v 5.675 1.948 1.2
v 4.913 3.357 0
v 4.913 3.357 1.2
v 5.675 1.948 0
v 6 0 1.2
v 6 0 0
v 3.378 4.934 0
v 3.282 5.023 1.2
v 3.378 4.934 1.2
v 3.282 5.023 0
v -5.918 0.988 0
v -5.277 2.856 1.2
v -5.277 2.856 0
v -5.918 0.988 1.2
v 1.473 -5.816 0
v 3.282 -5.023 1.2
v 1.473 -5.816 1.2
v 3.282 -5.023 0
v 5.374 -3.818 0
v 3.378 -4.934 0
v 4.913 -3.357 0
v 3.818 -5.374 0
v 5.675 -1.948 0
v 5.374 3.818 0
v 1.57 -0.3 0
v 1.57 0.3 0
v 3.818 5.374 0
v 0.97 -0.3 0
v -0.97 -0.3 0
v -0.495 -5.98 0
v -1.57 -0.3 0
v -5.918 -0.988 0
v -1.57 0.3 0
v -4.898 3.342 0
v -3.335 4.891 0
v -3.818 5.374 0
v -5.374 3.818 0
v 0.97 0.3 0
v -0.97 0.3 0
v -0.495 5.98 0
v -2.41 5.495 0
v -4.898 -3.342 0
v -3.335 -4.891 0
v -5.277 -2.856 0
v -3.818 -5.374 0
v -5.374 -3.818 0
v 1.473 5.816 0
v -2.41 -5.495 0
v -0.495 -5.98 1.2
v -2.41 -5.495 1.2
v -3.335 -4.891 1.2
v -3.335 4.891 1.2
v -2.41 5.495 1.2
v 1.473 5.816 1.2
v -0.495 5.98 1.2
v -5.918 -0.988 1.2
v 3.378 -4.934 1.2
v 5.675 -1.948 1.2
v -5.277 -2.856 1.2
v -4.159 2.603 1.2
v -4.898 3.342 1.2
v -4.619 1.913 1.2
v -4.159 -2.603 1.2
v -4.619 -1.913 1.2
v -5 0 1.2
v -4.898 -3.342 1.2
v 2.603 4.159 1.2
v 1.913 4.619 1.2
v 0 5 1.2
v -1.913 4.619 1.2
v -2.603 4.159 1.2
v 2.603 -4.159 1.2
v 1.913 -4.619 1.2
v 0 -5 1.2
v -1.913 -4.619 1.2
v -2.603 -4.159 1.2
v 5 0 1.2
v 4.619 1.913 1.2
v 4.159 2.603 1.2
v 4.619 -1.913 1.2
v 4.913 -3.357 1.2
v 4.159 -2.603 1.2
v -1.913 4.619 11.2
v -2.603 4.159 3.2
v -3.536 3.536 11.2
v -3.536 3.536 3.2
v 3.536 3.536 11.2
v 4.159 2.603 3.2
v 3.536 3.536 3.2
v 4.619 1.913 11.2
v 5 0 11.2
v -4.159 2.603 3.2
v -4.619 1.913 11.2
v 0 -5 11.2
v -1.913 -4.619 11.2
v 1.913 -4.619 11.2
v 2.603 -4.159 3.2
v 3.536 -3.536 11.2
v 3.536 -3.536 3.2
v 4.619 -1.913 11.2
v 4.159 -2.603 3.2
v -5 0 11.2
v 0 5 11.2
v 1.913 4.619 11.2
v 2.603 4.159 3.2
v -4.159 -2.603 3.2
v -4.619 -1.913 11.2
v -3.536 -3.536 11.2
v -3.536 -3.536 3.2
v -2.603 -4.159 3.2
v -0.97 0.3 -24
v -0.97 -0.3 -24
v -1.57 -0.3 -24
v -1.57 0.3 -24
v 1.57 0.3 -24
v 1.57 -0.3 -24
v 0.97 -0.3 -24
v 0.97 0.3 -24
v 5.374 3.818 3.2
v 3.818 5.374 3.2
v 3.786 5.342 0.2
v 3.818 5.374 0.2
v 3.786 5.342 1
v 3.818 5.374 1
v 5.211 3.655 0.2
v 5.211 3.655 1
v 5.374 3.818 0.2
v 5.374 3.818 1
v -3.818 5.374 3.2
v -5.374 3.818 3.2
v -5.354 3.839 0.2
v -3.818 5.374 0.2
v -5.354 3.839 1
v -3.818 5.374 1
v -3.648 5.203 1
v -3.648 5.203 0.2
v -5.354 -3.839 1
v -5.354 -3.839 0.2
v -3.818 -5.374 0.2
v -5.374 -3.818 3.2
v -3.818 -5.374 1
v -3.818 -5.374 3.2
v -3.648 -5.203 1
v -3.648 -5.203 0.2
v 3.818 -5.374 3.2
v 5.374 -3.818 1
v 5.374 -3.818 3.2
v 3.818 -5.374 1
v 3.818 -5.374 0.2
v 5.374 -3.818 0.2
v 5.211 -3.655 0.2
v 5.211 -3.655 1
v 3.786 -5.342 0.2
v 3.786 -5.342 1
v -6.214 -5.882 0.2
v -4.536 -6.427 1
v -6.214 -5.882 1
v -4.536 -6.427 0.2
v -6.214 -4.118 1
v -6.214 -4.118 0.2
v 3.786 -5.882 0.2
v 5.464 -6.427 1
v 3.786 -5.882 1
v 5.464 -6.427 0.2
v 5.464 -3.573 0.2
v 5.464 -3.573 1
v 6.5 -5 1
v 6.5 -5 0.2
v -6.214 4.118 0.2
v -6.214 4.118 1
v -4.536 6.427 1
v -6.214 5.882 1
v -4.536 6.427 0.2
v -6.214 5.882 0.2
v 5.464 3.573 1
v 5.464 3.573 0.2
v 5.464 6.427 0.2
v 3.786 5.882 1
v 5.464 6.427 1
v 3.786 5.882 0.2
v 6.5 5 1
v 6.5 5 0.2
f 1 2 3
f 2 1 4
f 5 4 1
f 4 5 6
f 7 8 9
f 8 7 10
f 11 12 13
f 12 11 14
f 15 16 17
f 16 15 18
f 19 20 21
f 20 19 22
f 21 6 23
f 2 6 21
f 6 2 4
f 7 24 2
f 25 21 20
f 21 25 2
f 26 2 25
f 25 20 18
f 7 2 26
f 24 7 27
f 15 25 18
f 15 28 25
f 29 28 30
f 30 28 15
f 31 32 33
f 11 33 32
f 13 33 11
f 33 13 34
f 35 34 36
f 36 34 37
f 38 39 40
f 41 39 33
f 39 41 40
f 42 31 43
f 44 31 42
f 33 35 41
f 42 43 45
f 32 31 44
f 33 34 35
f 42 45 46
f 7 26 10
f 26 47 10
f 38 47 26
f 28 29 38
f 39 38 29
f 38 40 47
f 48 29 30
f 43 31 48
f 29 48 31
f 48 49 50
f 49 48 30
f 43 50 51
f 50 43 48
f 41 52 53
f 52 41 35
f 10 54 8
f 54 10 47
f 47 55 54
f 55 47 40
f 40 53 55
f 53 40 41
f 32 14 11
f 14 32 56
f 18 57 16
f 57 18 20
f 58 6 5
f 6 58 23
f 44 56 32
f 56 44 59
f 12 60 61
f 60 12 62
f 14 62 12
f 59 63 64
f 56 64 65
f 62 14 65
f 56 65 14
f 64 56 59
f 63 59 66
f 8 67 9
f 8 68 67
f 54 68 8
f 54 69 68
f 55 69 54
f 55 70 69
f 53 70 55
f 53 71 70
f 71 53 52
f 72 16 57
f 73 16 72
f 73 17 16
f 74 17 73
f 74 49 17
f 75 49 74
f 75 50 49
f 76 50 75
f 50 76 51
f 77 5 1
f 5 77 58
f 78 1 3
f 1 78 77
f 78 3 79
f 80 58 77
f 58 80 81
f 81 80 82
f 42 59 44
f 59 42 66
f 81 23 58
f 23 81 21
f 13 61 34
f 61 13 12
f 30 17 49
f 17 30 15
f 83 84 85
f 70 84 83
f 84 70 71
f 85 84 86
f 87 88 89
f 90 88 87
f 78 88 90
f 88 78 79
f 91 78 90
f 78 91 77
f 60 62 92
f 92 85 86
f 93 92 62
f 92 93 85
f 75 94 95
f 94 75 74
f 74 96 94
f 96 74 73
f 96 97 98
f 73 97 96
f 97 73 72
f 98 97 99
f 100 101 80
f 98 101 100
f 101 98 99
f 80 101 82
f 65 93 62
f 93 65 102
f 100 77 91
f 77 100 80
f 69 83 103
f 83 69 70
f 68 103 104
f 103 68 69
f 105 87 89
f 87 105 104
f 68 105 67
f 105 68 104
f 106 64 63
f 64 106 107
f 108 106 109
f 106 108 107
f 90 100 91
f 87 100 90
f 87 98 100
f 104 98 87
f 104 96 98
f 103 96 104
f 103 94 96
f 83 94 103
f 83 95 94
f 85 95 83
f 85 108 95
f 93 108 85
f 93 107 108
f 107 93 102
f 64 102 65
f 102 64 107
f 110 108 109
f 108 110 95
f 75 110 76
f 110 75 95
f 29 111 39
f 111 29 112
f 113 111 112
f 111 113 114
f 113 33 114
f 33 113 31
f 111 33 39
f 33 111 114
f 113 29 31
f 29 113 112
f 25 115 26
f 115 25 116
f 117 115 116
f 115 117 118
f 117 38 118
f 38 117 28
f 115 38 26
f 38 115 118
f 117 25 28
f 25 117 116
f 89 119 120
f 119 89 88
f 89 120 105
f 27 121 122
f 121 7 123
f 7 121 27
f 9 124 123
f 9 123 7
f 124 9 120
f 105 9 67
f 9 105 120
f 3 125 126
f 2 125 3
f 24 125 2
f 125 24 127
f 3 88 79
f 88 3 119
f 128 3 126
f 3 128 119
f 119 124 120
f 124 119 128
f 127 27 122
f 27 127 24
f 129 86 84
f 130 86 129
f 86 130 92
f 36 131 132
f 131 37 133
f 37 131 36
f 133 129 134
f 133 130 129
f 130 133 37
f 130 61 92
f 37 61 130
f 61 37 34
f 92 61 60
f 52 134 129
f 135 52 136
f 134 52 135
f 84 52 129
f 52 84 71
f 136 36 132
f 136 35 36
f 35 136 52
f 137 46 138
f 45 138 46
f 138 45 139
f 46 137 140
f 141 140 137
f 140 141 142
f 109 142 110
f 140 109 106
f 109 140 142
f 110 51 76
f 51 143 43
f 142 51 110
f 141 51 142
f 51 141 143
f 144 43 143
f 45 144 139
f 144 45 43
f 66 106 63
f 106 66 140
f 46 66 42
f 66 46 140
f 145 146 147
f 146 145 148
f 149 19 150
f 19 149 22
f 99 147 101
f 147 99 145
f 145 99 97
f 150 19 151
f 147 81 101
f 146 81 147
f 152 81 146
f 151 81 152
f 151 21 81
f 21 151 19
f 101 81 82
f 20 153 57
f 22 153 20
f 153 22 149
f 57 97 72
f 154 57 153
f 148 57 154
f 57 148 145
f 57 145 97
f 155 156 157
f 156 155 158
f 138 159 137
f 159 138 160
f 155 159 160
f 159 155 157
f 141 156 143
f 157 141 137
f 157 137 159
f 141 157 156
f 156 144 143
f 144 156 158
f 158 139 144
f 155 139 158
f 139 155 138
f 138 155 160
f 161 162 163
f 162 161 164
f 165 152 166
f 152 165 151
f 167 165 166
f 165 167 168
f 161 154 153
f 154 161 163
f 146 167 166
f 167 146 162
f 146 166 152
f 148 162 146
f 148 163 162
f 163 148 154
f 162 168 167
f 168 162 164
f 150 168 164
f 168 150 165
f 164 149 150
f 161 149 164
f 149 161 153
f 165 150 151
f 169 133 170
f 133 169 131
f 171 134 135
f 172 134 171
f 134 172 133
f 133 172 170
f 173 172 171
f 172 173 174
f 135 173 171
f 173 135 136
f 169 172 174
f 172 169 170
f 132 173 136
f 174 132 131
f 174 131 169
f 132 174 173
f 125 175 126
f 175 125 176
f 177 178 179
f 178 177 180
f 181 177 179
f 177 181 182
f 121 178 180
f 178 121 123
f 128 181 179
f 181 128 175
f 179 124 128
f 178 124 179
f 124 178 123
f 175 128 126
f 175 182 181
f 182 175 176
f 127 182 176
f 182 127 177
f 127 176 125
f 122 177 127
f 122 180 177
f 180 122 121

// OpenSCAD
// Parameters
led_diameter_mm = 10; //[5:20:0.1]
body_height_mm = 11; //[5.5:22:0.1]
rim_diameter_mm = 12; //[8:24:0.1]
rim_thickness_mm = 1.2; //[0.6:2.4:0.1]
lead_pitch_mm = 2.54; //[1.27:5.08:0.01]
lead_thickness_mm = 0.6; //[0.3:1.2:0.05]
lead_length_mm = 25; //[10:50:0.5]
overlap_mm = 1; //[0.5:2:0.1]
lens_round_radius_mm = 5; //[2.5:10:0.1]
grill_width_mm = 20; //[10:40:0.5]
grill_height_mm = 20; //[10:40:0.5]
grill_hole_mm = 3; //[1.5:6:0.1]
grill_gap_mm = 2; //[1:6:0.1]
grill_marker_height_mm = 0.8; //[0.4:2:0.1]

// LED - complete geometry (single connected solid)
module led() {

  // Derived Z references (keep everything formula-based and connected)
  rim_zc   = rim_thickness_mm/2;                         // rim center Z
  rim_top  = rim_thickness_mm;                           // rim top Z
  body_zc  = rim_top + body_height_mm/2 - overlap_mm;     // body center Z (overlaps rim)
  body_top = body_zc + body_height_mm/2;                 // body top Z

  // Side tabs/clips (must intersect the LED body, not just the rim)
  // Fix: make tabs span the rim+lower body region and push them radially inward
  // so they overlap the LED body cylinder by ~1-2mm.
  tab_radial_overlap = 1.5; // mm overlap into LED body (guaranteed connection)
  tab_len = 3.0;            // outward length
  tab_w   = 2.2;            // tangential width

  // Z: center tabs so they intersect both rim and the lower body (no vertical gap)
  tab_h  = rim_thickness_mm + 2*overlap_mm;              // ensure Z overlap
  tab_zc = rim_zc + overlap_mm;                          // slightly above rim center

  // R: place tabs so their inner face intrudes into the LED body radius
  body_r = led_diameter_mm/2;
  tab_center_r = body_r + tab_len/2 - tab_radial_overlap;

  module side_tabs() {
    color("Silver")
      union() {
        for (a = [45, 135, 225, 315]) {
          rotate([0,0,a])
            translate([tab_center_r, 0, tab_zc])
              cube([tab_len, tab_w, tab_h], center=true);
        }
      }
  }

  // Entire LED as one union so all parts are physically connected
  union() {

    // Red LED body + rim + leads (kept as one connected solid)
    color("red")
      union() {
        // Rim/Flange
        translate([0, 0, rim_zc])
          cylinder(r=rim_diameter_mm/2, h=rim_thickness_mm, center=true);

        // LED Body (overlaps rim by overlap_mm)
        translate([0, 0, body_zc])
          cylinder(r=led_diameter_mm/2, h=body_height_mm, center=true);

        // Lens dome (overlaps body)
        translate([0, 0, body_top - lens_round_radius_mm - overlap_mm])
          sphere(r=lens_round_radius_mm);

        // Leads (overlap into rim by overlap_mm)
        translate([-lead_pitch_mm/2, 0, -lead_length_mm/2 + overlap_mm])
          cube([lead_thickness_mm, lead_thickness_mm, lead_length_mm], center=true);
        translate([ lead_pitch_mm/2, 0, -lead_length_mm/2 + overlap_mm])
          cube([lead_thickness_mm, lead_thickness_mm, lead_length_mm], center=true);
      }

    // Gray side tabs/clips (now physically attached via overlap into LED body + rim)
    side_tabs();
  }
}

// Grill Hole Positions - complete geometry (kept as separate markers)
module grill_hole_positions() {
  color("Silver") {
    union() {
      translate([-grill_width_mm/4, -grill_height_mm/4, rim_thickness_mm/2])
        cylinder(r=grill_hole_mm/2, h=grill_marker_height_mm, center=true);
      translate([grill_width_mm/4, -grill_height_mm/4, rim_thickness_mm/2])
        cylinder(r=grill_hole_mm/2, h=grill_marker_height_mm, center=true);
      translate([-grill_width_mm/4, grill_height_mm/4, rim_thickness_mm/2])
        cylinder(r=grill_hole_mm/2, h=grill_marker_height_mm, center=true);
      translate([grill_width_mm/4, grill_height_mm/4, rim_thickness_mm/2])
        cylinder(r=grill_hole_mm/2, h=grill_marker_height_mm, center=true);
    }
  }
}

// Assembly
module assembly() {
  union() {
    led();
    grill_hole_positions();
  }
}

assembly();
